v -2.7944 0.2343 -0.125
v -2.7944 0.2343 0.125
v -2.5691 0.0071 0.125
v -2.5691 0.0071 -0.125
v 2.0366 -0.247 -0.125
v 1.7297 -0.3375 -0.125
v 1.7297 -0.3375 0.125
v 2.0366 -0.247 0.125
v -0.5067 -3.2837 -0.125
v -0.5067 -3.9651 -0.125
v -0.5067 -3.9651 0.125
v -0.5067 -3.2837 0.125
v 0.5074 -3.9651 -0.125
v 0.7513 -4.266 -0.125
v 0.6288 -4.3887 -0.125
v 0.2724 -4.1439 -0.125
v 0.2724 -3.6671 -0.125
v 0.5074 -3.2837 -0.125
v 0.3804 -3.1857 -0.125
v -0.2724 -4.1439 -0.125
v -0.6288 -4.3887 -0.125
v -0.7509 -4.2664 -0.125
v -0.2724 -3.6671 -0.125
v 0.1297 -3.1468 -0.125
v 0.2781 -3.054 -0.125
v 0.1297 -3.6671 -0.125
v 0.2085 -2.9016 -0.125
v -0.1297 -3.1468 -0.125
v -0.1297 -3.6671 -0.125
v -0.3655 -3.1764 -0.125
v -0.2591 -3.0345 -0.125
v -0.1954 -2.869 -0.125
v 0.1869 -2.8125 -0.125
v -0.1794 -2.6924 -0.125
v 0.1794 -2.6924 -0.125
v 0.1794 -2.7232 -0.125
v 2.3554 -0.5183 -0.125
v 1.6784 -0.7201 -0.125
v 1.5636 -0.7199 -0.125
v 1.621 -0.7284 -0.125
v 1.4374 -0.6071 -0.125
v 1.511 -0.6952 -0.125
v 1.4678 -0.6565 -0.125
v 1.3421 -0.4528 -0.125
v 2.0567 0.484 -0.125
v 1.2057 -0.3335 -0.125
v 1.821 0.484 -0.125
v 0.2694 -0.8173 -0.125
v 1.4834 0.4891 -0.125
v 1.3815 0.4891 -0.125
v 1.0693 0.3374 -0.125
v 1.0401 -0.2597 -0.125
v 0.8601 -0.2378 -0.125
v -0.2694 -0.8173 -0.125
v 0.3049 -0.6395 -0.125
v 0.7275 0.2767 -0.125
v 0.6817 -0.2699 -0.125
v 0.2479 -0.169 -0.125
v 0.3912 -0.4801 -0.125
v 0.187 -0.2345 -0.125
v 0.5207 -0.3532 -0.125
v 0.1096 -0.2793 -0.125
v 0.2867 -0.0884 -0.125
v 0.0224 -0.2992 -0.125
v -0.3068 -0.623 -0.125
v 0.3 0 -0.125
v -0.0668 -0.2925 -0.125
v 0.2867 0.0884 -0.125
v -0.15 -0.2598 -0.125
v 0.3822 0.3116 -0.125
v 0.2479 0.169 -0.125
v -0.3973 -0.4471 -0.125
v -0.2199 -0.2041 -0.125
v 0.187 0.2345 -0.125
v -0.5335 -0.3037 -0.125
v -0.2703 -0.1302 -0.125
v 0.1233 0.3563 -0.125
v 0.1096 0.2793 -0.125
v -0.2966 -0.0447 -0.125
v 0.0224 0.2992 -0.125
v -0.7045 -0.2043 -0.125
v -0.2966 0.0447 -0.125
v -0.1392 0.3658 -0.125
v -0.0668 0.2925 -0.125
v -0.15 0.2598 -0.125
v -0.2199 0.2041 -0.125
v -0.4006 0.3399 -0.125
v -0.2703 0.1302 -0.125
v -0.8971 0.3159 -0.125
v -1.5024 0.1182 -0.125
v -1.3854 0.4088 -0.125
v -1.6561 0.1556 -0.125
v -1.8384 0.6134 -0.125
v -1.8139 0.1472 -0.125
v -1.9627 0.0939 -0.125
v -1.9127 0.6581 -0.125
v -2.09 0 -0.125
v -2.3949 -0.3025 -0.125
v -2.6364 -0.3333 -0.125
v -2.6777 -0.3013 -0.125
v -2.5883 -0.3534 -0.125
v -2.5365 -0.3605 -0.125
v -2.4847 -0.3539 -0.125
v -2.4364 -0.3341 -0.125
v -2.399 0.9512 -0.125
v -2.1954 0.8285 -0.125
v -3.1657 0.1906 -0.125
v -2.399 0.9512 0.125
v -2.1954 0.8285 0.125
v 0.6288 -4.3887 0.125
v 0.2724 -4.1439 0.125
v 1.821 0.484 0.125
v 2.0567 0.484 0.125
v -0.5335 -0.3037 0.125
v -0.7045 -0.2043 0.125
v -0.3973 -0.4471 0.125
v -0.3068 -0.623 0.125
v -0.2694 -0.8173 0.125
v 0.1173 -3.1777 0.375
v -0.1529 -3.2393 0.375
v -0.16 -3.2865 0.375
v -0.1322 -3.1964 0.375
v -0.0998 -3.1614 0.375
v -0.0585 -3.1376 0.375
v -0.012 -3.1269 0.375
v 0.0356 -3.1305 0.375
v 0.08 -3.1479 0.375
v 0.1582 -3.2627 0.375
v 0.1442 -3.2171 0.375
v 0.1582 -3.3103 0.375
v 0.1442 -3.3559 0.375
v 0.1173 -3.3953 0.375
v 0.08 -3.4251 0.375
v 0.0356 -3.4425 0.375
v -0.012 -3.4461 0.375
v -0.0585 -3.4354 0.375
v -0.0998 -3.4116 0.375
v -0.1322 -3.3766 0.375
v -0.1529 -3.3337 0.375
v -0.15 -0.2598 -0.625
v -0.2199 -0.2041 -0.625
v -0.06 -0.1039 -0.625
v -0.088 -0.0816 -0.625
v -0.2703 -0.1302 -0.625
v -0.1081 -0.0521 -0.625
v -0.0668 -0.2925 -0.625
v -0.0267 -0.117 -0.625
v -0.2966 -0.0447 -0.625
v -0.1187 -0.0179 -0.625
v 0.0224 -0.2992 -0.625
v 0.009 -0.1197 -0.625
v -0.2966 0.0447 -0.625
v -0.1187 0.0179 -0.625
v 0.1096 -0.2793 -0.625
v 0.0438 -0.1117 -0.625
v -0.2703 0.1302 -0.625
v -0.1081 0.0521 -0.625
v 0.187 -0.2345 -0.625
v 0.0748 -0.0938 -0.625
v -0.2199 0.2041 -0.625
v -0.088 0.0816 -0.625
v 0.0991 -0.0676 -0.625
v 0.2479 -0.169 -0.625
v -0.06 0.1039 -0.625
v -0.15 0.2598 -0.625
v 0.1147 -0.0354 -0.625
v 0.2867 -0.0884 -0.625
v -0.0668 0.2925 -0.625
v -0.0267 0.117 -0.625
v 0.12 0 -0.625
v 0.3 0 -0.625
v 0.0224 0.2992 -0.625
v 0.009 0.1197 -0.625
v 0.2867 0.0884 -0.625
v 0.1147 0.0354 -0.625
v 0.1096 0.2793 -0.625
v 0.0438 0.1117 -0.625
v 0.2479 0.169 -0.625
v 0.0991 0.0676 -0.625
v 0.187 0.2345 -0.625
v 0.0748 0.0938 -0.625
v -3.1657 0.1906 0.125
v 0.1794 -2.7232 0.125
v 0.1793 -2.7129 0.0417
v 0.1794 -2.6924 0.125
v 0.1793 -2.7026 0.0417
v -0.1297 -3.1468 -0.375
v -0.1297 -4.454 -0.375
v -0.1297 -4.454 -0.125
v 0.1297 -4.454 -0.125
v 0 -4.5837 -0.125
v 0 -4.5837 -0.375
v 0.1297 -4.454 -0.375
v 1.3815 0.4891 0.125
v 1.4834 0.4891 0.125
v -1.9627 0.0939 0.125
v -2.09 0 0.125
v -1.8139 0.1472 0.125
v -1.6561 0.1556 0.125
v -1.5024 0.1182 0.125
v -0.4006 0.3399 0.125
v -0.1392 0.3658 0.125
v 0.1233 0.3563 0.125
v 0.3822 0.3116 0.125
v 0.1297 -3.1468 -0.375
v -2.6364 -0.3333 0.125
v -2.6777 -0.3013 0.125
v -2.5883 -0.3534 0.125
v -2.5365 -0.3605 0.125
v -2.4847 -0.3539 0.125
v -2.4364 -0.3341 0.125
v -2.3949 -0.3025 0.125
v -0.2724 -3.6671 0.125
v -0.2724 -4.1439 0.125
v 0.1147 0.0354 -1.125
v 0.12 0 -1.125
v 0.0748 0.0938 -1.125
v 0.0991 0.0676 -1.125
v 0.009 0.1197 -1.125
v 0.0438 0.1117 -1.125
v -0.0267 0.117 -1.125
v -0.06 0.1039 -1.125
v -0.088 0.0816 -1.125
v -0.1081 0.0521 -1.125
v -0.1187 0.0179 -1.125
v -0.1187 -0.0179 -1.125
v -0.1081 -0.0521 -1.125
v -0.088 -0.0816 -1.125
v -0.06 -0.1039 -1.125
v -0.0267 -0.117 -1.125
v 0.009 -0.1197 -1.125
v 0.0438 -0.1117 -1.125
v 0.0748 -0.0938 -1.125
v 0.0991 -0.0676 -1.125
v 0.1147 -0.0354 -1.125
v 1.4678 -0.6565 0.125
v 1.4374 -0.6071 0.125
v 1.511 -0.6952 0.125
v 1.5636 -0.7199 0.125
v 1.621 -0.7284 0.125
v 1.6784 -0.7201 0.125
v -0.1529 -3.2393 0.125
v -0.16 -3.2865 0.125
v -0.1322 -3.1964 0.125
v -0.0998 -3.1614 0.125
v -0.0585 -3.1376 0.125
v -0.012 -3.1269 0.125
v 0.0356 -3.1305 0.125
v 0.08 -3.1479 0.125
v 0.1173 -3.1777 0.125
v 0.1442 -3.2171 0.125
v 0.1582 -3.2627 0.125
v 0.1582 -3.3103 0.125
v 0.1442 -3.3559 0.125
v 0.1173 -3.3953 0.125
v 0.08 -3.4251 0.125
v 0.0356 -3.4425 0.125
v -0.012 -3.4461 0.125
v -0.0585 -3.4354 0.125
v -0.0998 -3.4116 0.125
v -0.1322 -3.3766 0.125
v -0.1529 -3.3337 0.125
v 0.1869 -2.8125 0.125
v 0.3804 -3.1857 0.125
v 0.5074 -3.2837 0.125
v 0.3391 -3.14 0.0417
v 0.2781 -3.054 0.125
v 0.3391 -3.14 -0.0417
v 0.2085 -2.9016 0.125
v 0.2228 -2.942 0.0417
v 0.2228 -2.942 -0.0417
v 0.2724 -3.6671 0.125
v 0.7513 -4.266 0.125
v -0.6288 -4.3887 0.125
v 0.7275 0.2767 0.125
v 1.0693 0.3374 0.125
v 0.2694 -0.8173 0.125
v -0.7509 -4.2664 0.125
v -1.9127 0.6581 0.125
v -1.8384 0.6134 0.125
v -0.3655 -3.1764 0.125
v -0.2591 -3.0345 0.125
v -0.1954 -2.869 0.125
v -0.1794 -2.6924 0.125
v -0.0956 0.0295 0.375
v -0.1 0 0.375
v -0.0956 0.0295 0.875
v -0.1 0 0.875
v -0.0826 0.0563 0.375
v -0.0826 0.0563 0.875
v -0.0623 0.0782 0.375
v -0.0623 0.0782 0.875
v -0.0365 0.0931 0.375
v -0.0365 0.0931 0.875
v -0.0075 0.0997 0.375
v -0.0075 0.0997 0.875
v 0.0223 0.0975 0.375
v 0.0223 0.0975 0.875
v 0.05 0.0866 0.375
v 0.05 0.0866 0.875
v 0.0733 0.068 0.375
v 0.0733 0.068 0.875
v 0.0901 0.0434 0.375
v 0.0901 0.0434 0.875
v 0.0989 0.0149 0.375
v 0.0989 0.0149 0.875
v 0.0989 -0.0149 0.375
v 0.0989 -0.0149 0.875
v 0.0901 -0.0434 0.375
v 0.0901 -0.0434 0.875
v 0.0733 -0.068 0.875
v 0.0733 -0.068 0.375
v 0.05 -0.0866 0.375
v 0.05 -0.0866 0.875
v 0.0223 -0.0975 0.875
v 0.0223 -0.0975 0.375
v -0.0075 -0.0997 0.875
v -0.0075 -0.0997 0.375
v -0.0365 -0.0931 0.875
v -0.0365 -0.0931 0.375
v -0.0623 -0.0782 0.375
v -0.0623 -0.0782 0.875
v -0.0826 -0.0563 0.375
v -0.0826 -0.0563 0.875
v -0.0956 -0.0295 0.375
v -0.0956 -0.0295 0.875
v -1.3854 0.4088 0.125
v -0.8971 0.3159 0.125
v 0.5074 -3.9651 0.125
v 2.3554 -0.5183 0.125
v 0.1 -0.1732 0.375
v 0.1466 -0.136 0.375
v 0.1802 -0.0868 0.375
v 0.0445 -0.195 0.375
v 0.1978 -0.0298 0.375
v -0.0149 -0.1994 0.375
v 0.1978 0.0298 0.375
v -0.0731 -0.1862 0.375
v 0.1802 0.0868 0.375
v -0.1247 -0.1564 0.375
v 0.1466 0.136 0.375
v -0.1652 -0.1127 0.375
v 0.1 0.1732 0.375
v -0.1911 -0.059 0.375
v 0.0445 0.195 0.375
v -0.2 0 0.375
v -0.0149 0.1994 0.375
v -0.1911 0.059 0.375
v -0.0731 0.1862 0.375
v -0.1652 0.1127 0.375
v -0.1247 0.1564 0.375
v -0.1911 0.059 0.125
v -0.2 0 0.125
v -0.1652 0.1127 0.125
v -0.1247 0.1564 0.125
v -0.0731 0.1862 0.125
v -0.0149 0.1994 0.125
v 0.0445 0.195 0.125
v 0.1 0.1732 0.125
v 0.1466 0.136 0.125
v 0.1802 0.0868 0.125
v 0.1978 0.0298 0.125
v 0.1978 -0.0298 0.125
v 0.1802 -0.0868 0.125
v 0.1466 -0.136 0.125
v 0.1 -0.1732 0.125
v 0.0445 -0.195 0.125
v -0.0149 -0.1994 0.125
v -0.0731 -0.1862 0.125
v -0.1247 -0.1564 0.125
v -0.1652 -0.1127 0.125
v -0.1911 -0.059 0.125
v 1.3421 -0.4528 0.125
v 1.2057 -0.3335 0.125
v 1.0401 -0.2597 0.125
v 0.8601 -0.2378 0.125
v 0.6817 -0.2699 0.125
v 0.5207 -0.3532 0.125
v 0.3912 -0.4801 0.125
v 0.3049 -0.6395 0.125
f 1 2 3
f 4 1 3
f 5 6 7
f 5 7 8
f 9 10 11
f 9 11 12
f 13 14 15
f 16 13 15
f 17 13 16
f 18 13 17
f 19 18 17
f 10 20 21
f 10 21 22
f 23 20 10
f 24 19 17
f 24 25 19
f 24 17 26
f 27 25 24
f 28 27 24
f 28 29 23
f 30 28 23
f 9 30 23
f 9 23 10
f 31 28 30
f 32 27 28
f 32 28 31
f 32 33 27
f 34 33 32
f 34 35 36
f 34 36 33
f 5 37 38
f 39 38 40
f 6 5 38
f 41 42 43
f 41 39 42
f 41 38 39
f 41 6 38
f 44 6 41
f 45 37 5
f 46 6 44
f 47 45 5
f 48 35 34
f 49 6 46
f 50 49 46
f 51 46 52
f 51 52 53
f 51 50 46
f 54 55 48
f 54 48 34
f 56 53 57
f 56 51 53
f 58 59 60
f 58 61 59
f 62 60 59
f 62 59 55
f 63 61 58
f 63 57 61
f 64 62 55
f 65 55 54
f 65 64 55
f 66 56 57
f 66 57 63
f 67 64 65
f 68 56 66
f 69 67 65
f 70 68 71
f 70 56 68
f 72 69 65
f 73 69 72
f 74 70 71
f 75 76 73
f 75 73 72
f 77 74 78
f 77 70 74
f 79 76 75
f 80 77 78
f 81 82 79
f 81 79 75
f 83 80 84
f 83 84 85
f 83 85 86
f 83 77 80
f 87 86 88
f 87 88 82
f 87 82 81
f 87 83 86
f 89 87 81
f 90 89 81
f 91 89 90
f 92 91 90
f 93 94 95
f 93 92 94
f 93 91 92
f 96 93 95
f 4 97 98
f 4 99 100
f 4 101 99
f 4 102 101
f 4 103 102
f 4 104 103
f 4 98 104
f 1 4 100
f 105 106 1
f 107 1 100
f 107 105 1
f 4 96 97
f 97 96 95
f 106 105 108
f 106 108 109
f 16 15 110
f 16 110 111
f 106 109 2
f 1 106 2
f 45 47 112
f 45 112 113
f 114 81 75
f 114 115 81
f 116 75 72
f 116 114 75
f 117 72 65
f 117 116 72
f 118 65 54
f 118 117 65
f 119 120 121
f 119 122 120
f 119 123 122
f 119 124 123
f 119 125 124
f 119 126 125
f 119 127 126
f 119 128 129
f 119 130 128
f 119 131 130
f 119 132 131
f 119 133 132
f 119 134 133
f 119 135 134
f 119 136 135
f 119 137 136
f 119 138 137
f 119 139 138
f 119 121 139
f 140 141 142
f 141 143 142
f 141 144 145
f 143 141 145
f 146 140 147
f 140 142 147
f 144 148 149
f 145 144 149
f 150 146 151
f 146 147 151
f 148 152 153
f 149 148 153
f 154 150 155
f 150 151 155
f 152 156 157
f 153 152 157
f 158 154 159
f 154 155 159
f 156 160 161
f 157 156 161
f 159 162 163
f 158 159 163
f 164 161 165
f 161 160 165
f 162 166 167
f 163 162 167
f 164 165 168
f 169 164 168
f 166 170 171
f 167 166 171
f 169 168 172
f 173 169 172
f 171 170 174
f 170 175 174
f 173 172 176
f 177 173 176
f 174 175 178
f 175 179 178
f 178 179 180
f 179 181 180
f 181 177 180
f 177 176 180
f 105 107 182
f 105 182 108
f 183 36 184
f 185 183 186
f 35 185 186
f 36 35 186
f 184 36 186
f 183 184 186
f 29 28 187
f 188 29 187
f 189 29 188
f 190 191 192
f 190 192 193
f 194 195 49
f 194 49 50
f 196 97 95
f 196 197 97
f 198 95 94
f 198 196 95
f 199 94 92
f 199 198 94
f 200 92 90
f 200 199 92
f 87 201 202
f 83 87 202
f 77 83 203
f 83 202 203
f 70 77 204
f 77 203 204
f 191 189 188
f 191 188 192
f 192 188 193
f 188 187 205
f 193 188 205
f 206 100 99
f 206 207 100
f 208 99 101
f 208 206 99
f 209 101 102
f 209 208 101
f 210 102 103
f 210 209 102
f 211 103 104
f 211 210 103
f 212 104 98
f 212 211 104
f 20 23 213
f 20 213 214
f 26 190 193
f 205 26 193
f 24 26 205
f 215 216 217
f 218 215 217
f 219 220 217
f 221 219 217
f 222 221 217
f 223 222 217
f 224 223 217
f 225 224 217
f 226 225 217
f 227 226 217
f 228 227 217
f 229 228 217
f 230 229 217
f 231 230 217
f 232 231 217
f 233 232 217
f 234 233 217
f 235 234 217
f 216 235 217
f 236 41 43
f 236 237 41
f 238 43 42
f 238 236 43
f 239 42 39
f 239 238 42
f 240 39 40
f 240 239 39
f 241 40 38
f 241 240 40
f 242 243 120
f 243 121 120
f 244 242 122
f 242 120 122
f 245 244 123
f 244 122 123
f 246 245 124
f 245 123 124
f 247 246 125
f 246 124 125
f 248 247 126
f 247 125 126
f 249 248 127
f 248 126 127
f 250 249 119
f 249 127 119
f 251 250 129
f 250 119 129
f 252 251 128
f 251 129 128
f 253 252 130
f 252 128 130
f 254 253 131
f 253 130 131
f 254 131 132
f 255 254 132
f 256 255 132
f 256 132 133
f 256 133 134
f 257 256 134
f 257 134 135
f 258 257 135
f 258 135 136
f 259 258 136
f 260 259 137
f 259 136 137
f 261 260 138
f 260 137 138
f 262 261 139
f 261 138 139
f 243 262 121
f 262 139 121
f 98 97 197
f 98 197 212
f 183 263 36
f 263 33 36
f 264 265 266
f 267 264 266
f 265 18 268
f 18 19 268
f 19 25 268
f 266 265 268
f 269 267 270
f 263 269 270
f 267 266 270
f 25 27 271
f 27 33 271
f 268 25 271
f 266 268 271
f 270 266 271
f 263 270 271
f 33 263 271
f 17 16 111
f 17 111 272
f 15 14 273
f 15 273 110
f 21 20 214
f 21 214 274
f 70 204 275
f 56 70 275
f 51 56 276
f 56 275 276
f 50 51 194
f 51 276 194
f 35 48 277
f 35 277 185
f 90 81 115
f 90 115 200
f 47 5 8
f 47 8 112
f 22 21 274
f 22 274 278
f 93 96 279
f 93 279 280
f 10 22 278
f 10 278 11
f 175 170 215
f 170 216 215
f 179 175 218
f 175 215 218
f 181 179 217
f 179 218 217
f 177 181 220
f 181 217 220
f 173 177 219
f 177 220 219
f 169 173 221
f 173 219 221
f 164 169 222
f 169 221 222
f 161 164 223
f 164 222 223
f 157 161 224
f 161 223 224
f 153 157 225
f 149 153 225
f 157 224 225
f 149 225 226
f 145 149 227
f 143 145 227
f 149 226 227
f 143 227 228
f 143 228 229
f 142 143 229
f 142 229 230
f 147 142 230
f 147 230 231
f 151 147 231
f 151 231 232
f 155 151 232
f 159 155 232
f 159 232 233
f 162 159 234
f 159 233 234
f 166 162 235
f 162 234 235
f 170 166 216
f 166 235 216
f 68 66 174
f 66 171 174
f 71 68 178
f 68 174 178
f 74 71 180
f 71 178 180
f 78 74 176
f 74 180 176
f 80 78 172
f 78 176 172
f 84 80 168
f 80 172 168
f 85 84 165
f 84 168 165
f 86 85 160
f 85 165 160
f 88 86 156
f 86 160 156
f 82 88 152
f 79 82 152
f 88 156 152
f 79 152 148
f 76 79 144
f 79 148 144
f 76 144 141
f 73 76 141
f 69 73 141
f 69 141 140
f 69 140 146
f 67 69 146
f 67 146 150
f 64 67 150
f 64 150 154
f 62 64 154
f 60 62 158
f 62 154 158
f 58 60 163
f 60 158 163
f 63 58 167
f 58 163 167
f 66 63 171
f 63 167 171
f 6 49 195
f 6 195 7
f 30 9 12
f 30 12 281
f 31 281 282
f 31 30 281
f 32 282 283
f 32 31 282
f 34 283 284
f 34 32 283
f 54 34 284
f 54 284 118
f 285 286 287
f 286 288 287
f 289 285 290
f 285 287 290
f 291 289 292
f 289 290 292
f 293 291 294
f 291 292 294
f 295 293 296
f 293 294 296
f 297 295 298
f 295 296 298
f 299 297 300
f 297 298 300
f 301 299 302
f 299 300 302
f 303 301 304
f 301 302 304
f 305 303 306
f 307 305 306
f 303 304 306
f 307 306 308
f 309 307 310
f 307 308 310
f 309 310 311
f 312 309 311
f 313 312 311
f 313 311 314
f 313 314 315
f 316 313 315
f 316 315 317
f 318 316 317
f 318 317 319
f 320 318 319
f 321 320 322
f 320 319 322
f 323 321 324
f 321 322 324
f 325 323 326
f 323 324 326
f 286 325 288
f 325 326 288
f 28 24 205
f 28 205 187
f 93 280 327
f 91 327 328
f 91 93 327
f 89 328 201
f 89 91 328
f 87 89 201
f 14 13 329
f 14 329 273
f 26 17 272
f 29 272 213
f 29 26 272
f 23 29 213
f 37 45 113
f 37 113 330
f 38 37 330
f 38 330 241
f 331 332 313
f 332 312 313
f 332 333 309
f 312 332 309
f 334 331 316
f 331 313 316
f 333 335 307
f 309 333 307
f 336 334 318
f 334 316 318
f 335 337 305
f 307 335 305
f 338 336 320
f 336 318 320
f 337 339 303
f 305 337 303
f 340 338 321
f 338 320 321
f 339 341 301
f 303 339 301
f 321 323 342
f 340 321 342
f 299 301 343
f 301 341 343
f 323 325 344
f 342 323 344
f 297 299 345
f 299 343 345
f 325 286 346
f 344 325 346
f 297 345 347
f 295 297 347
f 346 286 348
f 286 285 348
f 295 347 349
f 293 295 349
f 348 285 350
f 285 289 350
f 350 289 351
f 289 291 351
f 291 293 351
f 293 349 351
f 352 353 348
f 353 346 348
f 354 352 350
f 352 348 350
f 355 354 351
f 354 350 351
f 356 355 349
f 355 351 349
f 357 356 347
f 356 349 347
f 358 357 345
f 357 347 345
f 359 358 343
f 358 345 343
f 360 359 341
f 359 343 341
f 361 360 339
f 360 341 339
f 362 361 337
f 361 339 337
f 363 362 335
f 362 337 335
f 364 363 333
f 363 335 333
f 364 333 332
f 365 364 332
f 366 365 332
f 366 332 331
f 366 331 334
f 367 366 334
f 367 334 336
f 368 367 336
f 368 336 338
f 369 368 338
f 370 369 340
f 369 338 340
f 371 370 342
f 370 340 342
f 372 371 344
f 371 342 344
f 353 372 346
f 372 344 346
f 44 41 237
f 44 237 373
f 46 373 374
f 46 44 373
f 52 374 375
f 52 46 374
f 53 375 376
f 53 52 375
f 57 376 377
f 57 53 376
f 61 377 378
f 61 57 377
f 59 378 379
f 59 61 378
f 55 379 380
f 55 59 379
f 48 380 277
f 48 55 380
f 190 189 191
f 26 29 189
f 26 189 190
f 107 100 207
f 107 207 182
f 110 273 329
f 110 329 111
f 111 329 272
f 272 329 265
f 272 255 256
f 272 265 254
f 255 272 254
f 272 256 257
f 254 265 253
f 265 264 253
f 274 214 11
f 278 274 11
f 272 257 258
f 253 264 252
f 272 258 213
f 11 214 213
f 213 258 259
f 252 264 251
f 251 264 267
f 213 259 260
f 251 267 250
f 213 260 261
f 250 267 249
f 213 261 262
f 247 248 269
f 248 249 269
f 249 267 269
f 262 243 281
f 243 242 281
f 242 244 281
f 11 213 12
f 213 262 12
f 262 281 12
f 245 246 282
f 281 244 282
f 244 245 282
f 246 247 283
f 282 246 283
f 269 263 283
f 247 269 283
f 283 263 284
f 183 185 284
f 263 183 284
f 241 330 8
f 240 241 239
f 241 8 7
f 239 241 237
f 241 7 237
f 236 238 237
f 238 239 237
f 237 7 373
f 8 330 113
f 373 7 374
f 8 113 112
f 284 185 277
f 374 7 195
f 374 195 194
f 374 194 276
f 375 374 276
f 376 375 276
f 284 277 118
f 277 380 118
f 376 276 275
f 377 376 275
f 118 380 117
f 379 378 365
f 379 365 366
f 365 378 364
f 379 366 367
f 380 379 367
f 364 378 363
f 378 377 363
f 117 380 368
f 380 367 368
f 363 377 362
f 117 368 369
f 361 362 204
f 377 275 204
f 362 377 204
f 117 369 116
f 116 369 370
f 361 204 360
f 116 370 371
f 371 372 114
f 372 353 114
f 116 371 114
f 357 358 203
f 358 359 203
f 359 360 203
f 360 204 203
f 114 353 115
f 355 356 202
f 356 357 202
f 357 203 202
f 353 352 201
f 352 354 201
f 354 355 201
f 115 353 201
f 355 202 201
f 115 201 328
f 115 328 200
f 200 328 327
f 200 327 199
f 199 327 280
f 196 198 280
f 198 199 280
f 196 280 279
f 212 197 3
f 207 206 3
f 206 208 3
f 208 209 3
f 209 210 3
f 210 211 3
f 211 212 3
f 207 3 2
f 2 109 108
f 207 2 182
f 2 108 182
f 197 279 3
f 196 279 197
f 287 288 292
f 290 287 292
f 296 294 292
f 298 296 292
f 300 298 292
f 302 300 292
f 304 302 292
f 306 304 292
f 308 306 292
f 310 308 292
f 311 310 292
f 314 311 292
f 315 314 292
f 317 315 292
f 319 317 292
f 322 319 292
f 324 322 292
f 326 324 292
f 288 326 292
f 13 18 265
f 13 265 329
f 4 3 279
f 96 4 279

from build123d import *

# Parameters (mm, degrees)
BOSS_EXTRUDE1_DEPTH = 0.25
BOSS_EXTRUDE2_DEPTH = 0.25
CUT_EXTRUDE1_DEPTH  = 6.593003707
CUT_EXTRUDE2_DEPTH  = 6.593003707
DRAFT1_ANGLE        = 34.486089424
DRAFT2_ANGLE        = 50.980599525
DRAFT3_ANGLE        = 16.594713156
DRAFT4_ANGLE        = -16.43287546
DRAFT5_ANGLE        = 50.980599525
SKETCH5_W           = 0.16
SKETCH5_H           = 0.25
CHAMFER1_SIZE       = 0.063800239
FILLET1_R           = 0.2
FILLET2_R           = 0.544507155
FILLET3_R           = 0.697211686


with BuildPart() as part:
    # Sketch1 → Boss-Extrude1 (new body)
    with BuildSketch(Plane(origin=(0, 0, -0.125), x_dir=(-1, 0, 0), z_dir=(0, 0, -1))):
        with BuildLine():
            Line((-0.272408935, -3.667083787), (0.272408935, -3.667083787))
            Line((0.272408935, -3.667083787), (0.272408935, -4.143899332))
            Line((0.272408935, -4.143899332), (0.873103994, -4.143899332))
            Line((0.873103994, -4.143899332), (1.051569895, -3.965092957))
            Line((1.051569895, -3.965092957), (0.506698534, -3.965092957))
            Line((0.506698534, -3.965092957), (0.506698534, -3.283729886))
            ThreePointArc((0.506698534, -3.283729886), (0.259096573, -3.03452958), (0.179431493, -2.692387798))
            Line((0.179431493, -2.692387798), (0.290781228, -0.37153351))
            Line((0.290781228, -0.37153351), (1.835162636, 0.252738405))
            Line((1.835162636, 0.252738405), (2.536874566, -0.443310952))
            Line((2.536874566, -0.443310952), (3.165693689, 0.190623805))
            Line((3.165693689, 0.190623805), (2.398976763, 0.95115359))
            Line((2.398976763, 0.95115359), (1.838429548, 0.613387961))
            ThreePointArc((1.838429548, 0.613387961), (0.12624114, 0.405056697), (-1.168932242, 1.544142722))
            Line((-1.168932242, 1.544142722), (-1.729686411, -0.337503893))
            Line((-1.729686411, -0.337503893), (-1.821011369, -0.310568547))
            Line((-1.821011369, -0.310568547), (-1.821011369, 0.484030911))
            Line((-1.821011369, 0.484030911), (-2.056654947, 0.484030911))
            Line((-2.056654947, 0.484030911), (-2.056654947, -0.607371456))
            Line((-2.056654947, -0.607371456), (-1.482657454, -0.77842987))
            ThreePointArc((-1.482657454, -0.77842987), (-0.858095498, -0.237884247), (-0.269395252, -0.817279818))
            Line((-0.269395252, -0.817279818), (-0.179431493, -2.692387798))
            add(Edge.make_bspline(
                [(-0.179431493, -2.723199698), (-0.179183719, -2.712865075), (-0.179186918, -2.702588974), (-0.179431493, -2.692387798)],
                knots=[0, 0, 0, 0, 1, 1, 1, 1], degree=3))
            add(Edge.make_bspline(
                [(-0.507437255, -3.283729886), (-0.319927849, -3.178374639), (-0.179431493, -2.941093516), (-0.179431493, -2.723199698)],
                knots=[0, 0, 0, 0, 1, 1, 1, 1], degree=3))
            Line((-0.507437255, -3.283729886), (-0.507437255, -3.965092957))
            Line((-0.507437255, -3.965092957), (-1.051569895, -3.965092957))
            Line((-1.051569895, -3.965092957), (-0.628774335, -4.388695119))
            Line((-0.628774335, -4.388695119), (-0.272408935, -4.143899332))
            Line((-0.272408935, -4.143899332), (-0.272408935, -3.667083787))
        make_face()
    extrude(amount=-BOSS_EXTRUDE1_DEPTH)

    # Sketch2 → Boss-Extrude2 (add)
    with BuildSketch(Plane(origin=(0, 0, -0.125), x_dir=(-1, 0, 0), z_dir=(0, 0, -1))):
        Polygon((-0.129661741, -3.146789365), (0.129661741, -3.146789365), (0.129661741, -4.454012909), (0, -4.58367465), (-0.129661741, -4.454012909), align=None)
    extrude(amount=BOSS_EXTRUDE2_DEPTH)

    # Sketch3 → Cut-Extrude1 (cut, through all)
    with BuildSketch(Plane.XY.offset(0.125)):
        Polygon((-2.195377886, 0.828472215), (-2.794411885, 0.234272214), (-2.56905624, 0.007083233), (-1.912701402, 0.658141514), align=None)
    extrude(amount=-CUT_EXTRUDE1_DEPTH, mode=Mode.SUBTRACT)

    # Sketch4 → Cut-Extrude2 (cut, through all)
    with BuildSketch(Plane.XY.offset(0.125)):
        with BuildLine():
            Line((1.465134235, 0.550217916), (1.168932242, 1.544142722))
            ThreePointArc((1.168932242, 1.544142722), (0.534119283, 0.746589992), (-0.400581525, 0.339880942))
            ThreePointArc((-0.400581525, 0.339880942), (-0.007751749, 0.365487208), (0.382199804, 0.311554845))
            ThreePointArc((0.382199804, 0.311554845), (0.951331817, 0.305357276), (1.465134235, 0.550217916))
        make_face()
    extrude(amount=-CUT_EXTRUDE2_DEPTH, mode=Mode.SUBTRACT)

    # Draft1
    draft1_faces = [part.faces().sort_by_distance(p)[0] for p in [
        (-0.572756465, -4.143899332, 0),
    ]]
    draft(draft1_faces, Plane(origin=(-0.272408935, -3.667083787, 0.125), x_dir=(0, 0, 1), z_dir=(1, 0, 0)), DRAFT1_ANGLE)

    # Draft2
    draft2_faces = [part.faces().sort_by_distance(p)[0] for p in [
        (-0.779134215, -3.965092957, 0),
    ]]
    draft(draft2_faces, Plane(origin=(-0.506698534, -3.965092957, 0.125), x_dir=(0, -1, 0), z_dir=(-1, 0, 0)), DRAFT2_ANGLE)

    # Draft3
    draft3_faces = [part.faces().sort_by_distance(p)[0] for p in [
        (2.056654947, -0.061670272, 0),
    ]]
    draft(draft3_faces, Plane(origin=(1.821011369, 0.484030911, 0.125), x_dir=(1, 0, 0), z_dir=(0, 1, 0)), DRAFT3_ANGLE)

    # Draft4
    draft4_faces = [part.faces().sort_by_distance(p)[0] for p in [
        (1.821011369, 0.086731182, 0),
    ]]
    draft(draft4_faces, Plane(origin=(1.821011369, 0.484030911, 0.125), x_dir=(1, 0, 0), z_dir=(0, 1, 0)), DRAFT4_ANGLE)

    # Draft5
    draft5_faces = [part.faces().sort_by_distance(p)[0] for p in [
        (0.779503575, -3.965092957, 0),
    ]]
    draft(draft5_faces, Plane(origin=(0.507437255, -3.283729886, 0.125), x_dir=(0, 1, 0), z_dir=(1, 0, 0)), DRAFT5_ANGLE)

    # Sketch5 → Revolve1 (revolve)
    with BuildSketch(Plane.XZ.offset(3.286499627), mode=Mode.PRIVATE) as revolve1_sk:
        with Locations((0.08, 0.25)):
            Rectangle(SKETCH5_W, SKETCH5_H)
    revolve(revolve1_sk.sketch.rotate(Axis((0, -3.286499627, 0.375), (0, 0, -1)), 180), axis=Axis((0, -3.286499627, 0.375), (0, 0, -1)))

    # Sketch6 → Revolve2 (revolve)
    with BuildSketch(Plane.XZ, mode=Mode.PRIVATE) as revolve2_sk:
        Polygon((0.1, 0.875), (0, 0.875), (0, 0.125), (0.2, 0.125), (0.2, 0.375), (0.1, 0.375), align=None)
    revolve(revolve2_sk.sketch.rotate(Axis((0, 0, 0.875), (0, 0, -1)), 180), axis=Axis((0, 0, 0.875), (0, 0, -1)))

    # Sketch7 → Revolve3 (revolve)
    with BuildSketch(Plane(origin=(0, 0, 0), x_dir=(1, 0, 0), z_dir=(0, 1, 0))):
        Polygon((0.12, 1.125), (0, 1.125), (0, 0.125), (0.3, 0.125), (0.3, 0.625), (0.12, 0.625), align=None)
    revolve(axis=Axis((0, 0, -1.125), (0, 0, 1)))

    # Chamfer1
    # the kernel refuses this chamfer: 0.098147605, 0.063800239 mm, written as the material it takes off along each edge
    with BuildSketch(Plane(origin=(1.465134235, 0.550217916, 0.391937228), x_dir=(0.28559993905101894, -0.9583489316600996, 0), z_dir=(0, 0, -1))) as chamfer1_piece_1:
        with BuildLine():
            Line((CHAMFER1_SIZE * 1.00000000412, 0), (0.034717393, 0.097589357))
            ThreePointArc((0.034717393, 0.097589357), (0.018892926, 0.049933601), (0, 0))
            Line((0, 0), (CHAMFER1_SIZE * 1.00000000412, 0))
        make_face()
    extrude(amount=0.783874457, mode=Mode.SUBTRACT)

    # Fillet1
    fillet1_edges = [part.edges().sort_by_distance(p)[0] for p in [
        (1.482657454, -0.77842987, 0),
        (-2.536874566, -0.443310952, 0),
    ]]
    fillet(fillet1_edges, radius=FILLET1_R)

    # Fillet2
    fillet2_edges = [part.edges().sort_by_distance(p)[0] for p in [
        (-1.835162636, 0.252738405, 0),
    ]]
    fillet(fillet2_edges, radius=FILLET2_R)

    # Fillet3
    fillet3_edges = [part.edges().sort_by_distance(p)[0] for p in [
        (-0.290781228, -0.37153351, 0),
    ]]
    fillet(fillet3_edges, radius=FILLET3_R)


solid = part.part
